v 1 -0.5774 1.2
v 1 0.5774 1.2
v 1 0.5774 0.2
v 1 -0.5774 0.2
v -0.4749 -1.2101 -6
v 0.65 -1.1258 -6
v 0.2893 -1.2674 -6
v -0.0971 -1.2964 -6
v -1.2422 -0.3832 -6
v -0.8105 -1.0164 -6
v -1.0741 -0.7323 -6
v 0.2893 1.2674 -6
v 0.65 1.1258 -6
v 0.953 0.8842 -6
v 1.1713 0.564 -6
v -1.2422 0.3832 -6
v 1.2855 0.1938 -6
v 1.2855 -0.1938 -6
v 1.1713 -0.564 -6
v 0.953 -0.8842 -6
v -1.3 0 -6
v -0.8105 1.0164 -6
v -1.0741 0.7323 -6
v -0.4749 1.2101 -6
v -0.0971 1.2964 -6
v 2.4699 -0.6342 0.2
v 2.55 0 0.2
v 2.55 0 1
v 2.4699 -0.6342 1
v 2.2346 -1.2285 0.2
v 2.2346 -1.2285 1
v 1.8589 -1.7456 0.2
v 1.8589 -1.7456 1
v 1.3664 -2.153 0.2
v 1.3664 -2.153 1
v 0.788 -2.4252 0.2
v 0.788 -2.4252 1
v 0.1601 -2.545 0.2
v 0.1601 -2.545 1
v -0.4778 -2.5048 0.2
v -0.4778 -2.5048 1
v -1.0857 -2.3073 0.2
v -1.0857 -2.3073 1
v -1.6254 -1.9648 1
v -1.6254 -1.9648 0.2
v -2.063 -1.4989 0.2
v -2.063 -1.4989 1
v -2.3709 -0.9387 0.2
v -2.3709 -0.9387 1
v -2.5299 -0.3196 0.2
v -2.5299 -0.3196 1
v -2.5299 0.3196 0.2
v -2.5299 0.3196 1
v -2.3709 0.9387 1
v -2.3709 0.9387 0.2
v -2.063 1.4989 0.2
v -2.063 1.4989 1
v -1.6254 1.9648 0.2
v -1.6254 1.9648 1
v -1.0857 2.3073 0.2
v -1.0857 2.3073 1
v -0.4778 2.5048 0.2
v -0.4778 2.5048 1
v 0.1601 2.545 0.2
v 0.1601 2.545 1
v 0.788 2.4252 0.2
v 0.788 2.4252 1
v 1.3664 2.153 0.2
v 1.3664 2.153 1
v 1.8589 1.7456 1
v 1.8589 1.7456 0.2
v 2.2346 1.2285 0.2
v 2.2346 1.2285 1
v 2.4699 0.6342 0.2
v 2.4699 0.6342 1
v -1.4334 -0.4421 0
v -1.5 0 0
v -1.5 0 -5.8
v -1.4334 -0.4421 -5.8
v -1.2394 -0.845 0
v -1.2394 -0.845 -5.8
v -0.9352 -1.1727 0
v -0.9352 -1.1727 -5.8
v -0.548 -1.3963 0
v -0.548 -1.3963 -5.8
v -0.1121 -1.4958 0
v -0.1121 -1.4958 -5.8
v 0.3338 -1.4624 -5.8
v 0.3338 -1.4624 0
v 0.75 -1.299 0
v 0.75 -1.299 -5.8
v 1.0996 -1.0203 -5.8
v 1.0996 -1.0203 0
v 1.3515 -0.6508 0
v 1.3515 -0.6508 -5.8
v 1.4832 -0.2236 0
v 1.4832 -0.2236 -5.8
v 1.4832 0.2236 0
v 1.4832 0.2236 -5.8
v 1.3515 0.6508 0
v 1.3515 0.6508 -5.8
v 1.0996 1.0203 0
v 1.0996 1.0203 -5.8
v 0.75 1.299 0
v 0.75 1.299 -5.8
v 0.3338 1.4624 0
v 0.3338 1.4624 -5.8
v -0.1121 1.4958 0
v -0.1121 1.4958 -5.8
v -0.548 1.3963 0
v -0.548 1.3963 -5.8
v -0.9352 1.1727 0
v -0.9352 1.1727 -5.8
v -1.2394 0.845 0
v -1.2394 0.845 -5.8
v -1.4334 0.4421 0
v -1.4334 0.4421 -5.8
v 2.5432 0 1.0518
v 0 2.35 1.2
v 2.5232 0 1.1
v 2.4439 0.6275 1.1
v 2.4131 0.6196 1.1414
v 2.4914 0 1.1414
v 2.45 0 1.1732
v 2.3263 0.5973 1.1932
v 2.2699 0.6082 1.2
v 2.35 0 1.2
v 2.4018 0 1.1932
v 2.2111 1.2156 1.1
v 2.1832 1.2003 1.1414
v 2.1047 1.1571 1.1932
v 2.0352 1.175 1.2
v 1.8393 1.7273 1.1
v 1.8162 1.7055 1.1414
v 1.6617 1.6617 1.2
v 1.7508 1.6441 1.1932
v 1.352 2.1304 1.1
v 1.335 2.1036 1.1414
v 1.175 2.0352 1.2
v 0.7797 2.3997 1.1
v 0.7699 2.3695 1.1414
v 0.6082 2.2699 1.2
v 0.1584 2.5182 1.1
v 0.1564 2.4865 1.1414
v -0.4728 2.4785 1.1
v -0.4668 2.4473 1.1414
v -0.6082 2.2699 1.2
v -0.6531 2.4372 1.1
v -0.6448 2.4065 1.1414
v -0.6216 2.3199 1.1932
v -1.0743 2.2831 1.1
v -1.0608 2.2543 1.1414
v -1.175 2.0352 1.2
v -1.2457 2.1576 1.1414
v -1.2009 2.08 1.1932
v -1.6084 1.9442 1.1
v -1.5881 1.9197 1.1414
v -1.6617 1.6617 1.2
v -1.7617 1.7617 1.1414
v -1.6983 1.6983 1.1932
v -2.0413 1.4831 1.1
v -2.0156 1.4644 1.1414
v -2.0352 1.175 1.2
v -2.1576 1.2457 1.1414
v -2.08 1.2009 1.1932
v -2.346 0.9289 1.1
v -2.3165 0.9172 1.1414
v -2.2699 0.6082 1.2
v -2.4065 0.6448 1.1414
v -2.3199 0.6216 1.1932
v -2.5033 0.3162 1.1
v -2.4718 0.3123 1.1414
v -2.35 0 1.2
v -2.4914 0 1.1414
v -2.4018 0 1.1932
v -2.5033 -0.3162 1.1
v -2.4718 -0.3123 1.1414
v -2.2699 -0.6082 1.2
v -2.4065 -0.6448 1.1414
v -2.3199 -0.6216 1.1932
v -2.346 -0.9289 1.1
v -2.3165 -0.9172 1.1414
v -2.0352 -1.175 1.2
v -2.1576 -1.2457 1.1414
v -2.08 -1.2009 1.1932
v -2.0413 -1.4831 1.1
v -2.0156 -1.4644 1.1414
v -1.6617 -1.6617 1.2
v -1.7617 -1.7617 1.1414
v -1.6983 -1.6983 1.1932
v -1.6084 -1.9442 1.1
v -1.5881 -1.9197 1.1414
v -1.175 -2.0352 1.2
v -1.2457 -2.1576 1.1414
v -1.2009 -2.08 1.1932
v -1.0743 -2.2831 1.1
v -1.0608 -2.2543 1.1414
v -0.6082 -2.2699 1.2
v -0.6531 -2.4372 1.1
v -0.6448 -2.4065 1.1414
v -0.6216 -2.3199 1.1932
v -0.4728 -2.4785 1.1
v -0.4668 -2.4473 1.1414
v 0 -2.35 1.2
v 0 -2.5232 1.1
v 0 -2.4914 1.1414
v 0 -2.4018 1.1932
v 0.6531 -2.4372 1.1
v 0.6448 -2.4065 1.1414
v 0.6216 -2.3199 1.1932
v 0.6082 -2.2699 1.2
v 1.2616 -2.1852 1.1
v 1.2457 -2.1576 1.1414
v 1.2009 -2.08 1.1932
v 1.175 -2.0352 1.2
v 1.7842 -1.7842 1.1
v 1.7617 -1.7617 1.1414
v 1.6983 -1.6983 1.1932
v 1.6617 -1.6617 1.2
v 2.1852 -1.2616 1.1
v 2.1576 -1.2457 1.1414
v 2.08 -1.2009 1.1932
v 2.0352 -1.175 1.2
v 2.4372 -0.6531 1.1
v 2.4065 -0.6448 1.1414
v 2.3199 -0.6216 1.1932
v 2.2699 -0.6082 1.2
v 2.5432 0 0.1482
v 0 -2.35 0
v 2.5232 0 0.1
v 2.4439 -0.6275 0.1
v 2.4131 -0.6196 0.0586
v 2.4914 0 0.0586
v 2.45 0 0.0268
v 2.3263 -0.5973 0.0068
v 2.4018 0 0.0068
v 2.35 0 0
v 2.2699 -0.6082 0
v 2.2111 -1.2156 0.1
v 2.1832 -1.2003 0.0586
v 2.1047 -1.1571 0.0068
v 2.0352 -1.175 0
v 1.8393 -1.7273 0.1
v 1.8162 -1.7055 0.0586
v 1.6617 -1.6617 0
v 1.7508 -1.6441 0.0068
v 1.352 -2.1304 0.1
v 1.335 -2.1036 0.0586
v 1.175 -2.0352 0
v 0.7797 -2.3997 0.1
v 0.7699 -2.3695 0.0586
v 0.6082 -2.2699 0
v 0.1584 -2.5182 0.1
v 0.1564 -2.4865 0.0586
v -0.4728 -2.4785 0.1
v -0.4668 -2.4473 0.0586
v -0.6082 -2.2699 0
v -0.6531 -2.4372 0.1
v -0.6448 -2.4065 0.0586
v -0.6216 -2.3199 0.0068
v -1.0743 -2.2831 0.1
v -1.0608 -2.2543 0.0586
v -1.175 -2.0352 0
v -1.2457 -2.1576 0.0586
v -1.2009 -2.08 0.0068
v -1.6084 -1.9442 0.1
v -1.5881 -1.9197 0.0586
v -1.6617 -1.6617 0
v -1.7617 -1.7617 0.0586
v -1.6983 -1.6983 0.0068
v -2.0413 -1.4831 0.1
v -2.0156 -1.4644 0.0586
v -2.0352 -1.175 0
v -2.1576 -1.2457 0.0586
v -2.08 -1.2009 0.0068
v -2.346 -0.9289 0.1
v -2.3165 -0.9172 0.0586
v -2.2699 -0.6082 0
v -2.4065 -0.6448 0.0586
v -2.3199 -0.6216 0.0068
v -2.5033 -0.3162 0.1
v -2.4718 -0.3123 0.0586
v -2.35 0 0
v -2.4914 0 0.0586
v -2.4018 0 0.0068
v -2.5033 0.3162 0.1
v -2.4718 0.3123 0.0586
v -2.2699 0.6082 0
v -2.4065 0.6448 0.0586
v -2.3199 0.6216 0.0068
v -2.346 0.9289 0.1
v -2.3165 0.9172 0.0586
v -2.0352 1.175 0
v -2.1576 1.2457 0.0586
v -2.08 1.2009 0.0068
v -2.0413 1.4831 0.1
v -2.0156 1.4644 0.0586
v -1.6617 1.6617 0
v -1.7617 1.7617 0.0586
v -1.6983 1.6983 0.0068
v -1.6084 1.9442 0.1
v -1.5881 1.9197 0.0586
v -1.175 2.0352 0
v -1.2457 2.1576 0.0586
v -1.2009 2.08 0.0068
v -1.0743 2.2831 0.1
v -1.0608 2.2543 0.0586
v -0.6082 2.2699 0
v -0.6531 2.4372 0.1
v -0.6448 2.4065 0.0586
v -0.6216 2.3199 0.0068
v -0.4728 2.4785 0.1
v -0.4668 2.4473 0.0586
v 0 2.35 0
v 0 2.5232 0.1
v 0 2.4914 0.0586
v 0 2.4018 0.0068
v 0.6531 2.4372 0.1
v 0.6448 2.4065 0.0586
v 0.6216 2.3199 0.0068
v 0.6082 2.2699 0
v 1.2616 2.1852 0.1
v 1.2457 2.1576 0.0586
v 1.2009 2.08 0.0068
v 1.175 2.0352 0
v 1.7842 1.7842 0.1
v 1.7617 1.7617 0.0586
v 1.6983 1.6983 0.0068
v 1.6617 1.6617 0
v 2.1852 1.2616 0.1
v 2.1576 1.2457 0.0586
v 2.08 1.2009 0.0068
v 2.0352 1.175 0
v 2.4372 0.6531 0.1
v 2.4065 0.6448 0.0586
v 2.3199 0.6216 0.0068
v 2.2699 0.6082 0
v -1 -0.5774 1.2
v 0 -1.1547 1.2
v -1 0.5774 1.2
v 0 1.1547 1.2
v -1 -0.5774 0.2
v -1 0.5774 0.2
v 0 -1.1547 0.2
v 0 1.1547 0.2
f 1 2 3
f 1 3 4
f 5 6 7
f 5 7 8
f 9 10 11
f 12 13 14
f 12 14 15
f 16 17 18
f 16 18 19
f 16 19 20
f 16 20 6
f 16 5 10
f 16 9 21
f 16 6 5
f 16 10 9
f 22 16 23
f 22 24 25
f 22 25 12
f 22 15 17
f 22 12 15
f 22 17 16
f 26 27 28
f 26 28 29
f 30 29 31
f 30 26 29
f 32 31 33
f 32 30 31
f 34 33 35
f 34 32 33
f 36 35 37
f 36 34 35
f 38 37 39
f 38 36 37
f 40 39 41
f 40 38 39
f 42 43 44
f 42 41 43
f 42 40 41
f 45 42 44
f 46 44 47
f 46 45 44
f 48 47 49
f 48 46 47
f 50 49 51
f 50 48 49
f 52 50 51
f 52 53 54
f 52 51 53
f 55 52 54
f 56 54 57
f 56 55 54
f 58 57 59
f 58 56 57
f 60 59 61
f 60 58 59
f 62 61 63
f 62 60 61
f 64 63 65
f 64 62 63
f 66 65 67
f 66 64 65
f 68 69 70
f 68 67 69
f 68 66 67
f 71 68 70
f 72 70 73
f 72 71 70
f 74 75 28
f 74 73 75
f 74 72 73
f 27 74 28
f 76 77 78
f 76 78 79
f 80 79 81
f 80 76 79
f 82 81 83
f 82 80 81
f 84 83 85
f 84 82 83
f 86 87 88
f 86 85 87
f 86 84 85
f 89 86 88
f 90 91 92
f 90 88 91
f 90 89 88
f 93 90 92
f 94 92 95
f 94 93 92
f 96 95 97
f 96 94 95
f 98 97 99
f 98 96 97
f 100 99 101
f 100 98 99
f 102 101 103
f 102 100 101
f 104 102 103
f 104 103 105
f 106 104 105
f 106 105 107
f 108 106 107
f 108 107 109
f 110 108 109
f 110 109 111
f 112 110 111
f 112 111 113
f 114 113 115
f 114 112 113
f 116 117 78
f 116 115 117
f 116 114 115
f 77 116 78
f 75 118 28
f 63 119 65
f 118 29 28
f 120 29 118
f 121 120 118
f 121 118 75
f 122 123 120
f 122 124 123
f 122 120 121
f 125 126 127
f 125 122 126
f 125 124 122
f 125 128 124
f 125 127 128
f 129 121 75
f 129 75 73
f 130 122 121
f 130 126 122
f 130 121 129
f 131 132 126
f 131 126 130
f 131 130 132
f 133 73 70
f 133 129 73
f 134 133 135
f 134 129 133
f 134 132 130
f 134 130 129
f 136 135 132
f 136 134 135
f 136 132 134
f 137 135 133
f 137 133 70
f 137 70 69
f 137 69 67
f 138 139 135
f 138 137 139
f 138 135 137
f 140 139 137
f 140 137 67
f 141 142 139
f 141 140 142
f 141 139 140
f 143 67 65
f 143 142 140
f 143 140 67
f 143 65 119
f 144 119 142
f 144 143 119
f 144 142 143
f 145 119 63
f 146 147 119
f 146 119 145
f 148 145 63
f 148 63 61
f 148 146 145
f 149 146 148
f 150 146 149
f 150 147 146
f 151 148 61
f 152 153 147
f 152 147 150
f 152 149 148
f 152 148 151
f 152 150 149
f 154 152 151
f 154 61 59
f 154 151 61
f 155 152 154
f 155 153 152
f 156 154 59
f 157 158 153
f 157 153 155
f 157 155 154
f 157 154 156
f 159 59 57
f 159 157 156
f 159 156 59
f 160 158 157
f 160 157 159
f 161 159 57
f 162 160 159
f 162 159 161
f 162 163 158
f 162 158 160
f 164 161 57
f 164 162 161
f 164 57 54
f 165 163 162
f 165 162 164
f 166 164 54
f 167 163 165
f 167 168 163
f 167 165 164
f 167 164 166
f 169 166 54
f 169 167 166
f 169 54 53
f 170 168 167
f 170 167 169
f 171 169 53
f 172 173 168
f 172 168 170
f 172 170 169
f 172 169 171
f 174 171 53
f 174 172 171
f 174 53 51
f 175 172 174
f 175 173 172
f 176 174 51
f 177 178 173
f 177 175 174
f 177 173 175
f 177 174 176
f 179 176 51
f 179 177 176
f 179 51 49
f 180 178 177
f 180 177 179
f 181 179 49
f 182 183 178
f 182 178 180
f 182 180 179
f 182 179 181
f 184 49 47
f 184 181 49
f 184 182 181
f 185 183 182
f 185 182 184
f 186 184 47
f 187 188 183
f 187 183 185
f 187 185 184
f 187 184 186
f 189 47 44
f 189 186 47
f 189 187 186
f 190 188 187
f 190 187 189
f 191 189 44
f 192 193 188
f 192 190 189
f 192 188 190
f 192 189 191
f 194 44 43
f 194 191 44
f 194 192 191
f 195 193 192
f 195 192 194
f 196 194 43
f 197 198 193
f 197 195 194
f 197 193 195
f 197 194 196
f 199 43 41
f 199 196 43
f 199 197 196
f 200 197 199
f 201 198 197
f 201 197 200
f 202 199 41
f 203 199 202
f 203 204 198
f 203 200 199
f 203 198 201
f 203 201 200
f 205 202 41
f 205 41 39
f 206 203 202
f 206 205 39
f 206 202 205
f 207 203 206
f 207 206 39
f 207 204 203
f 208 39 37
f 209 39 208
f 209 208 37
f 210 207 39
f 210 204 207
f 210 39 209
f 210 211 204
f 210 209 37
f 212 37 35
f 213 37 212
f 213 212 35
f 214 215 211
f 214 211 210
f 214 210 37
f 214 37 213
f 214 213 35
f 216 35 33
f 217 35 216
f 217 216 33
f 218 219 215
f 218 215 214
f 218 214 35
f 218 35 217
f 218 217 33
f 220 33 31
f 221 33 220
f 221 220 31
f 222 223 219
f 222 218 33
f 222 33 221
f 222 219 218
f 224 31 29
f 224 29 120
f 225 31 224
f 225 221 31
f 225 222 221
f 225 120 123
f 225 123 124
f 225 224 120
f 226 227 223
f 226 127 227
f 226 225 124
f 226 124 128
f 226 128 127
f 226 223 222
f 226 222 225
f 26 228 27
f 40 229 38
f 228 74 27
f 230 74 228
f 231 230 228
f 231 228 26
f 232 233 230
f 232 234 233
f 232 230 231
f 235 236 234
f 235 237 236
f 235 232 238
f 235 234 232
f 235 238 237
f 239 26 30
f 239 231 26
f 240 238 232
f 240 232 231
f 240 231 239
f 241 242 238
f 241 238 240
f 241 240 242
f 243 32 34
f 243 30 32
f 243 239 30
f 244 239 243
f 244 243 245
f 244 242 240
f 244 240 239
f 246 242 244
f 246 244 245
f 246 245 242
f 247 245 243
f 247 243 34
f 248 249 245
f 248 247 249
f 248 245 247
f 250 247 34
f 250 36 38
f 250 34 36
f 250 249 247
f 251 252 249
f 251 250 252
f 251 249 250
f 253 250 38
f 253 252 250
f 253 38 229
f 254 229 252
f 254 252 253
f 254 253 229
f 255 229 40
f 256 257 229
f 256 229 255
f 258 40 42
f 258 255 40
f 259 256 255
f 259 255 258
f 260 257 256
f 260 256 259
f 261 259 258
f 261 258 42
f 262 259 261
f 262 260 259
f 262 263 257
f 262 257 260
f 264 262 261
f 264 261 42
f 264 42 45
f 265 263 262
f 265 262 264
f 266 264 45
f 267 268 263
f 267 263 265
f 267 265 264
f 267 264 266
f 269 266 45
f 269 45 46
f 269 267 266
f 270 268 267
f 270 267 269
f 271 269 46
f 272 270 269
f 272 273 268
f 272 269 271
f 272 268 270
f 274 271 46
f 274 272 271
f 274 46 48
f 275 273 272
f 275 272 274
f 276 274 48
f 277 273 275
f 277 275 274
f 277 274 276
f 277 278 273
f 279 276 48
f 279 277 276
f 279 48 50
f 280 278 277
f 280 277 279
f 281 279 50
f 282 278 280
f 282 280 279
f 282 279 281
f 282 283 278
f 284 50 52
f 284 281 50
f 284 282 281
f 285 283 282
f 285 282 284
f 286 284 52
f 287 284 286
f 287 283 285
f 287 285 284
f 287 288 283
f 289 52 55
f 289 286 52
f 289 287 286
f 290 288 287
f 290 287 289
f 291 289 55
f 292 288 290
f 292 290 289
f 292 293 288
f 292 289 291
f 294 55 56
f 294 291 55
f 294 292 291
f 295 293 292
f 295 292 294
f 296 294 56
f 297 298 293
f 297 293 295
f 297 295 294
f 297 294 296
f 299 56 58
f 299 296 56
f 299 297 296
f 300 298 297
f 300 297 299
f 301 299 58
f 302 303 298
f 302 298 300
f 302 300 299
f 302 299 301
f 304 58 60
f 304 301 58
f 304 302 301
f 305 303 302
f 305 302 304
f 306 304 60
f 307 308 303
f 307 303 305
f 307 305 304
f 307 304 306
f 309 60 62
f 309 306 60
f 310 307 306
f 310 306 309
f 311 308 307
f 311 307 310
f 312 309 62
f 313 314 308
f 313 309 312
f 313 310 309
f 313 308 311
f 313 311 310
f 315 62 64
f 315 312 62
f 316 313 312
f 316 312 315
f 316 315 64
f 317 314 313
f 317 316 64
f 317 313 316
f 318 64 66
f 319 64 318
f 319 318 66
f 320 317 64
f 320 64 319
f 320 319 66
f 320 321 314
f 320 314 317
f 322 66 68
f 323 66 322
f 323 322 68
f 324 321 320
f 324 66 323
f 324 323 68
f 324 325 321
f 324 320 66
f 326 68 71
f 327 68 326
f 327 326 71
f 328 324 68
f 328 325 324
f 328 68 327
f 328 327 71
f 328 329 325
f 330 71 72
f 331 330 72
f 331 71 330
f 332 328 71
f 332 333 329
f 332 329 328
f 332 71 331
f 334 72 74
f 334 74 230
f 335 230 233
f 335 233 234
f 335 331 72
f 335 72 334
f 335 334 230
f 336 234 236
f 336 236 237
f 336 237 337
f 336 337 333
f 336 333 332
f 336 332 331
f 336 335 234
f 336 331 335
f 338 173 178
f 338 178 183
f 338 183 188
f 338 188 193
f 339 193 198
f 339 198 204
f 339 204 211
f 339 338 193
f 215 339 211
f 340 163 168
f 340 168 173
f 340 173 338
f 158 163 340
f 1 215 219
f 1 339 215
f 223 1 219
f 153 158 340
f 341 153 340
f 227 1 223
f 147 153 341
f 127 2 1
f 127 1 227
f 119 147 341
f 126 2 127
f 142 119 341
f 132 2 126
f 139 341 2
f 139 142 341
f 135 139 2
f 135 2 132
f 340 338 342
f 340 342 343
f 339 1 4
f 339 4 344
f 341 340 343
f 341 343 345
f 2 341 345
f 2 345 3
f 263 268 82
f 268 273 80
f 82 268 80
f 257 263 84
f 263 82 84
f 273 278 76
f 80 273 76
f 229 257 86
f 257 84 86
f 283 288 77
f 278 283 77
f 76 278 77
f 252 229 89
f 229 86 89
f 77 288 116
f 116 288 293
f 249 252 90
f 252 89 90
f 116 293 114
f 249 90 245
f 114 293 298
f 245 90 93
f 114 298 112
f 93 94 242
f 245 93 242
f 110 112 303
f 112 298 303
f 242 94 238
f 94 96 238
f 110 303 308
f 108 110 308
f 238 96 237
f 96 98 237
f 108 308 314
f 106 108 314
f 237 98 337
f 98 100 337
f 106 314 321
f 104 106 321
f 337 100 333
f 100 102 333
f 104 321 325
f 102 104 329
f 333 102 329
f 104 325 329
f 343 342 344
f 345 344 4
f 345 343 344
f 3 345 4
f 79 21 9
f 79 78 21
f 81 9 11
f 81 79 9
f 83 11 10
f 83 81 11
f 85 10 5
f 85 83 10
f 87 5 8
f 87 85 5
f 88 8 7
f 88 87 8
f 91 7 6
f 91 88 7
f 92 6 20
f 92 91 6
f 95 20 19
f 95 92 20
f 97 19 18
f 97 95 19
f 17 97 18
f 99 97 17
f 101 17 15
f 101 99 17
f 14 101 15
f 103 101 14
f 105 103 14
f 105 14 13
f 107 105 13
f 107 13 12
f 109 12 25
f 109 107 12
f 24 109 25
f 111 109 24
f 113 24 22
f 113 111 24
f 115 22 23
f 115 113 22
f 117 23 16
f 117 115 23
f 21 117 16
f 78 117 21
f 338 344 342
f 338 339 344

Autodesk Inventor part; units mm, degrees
ref_plane "YZ Plane" through (0, 0, 0) normal (1, 0, 0) x (0, 1, 0)
ref_plane "XZ Plane" through (0, 0, 0) normal (0, 1, 0) x (-1, 0, 0)
ref_plane "XY Plane" through (0, 0, 0) normal (0, 0, 1) x (1, 0, 0)
sketch "スケッチ1" plane through (0, 0, 0) normal (0, 0, 1) x (1, 0, 0)
  circle A0 centre (0, 0) radius 2.55
  dimension "d0" = 5.1
extrude "押し出し1" add sketch "スケッチ1" along normal blind 1.2
sketch "スケッチ2" plane through (0, 0, 0) normal (0, 0, -1) x (-1, 0, 0)
  circle A0 centre (0, 0) radius 2.55 projected
  circle A1 centre (0, 0) radius 1.5
  dimension "d3" = 3
extrude "押し出し2" add sketch "スケッチ2" along normal blind 6 contours A1
thread "ねじ1" size "M3x0.5" class "6g" standard "ANSI Metric M Profile" full length
sketch "スケッチ3" plane through (0, 0, 1.2) normal (0, 0, 1) x (1, 0, 0)
  circle A0 centre (0, 0) radius 2.55 projected
  line L0 (0, 1.1547) -> (1, 0.5774)
  line L1 (1, 0.5774) -> (1, -0.5774)
  line L2 (1, -0.5774) -> (0, -1.1547)
  line L3 (0, -1.1547) -> (-1, -0.5774)
  line L4 (-1, -0.5774) -> (-1, 0.5774)
  line L5 (-1, 0.5774) -> (0, 1.1547)
  dimension "d8" = 2
extrude "押し出し3" cut sketch "スケッチ3" against normal blind 1 contours L0 L1 L2 L3 L4 L5
fillet "フィレット1" radius 0.2 2 edges at (-2.55, 0, 1.2) (-2.55, 0, 0)
chamfer "面取り1" distance 0.2 angle 45 1 edges at (1.5, 0, -6)
properties part number "六角穴付低頭平 M3 x 6" material "鋼"
